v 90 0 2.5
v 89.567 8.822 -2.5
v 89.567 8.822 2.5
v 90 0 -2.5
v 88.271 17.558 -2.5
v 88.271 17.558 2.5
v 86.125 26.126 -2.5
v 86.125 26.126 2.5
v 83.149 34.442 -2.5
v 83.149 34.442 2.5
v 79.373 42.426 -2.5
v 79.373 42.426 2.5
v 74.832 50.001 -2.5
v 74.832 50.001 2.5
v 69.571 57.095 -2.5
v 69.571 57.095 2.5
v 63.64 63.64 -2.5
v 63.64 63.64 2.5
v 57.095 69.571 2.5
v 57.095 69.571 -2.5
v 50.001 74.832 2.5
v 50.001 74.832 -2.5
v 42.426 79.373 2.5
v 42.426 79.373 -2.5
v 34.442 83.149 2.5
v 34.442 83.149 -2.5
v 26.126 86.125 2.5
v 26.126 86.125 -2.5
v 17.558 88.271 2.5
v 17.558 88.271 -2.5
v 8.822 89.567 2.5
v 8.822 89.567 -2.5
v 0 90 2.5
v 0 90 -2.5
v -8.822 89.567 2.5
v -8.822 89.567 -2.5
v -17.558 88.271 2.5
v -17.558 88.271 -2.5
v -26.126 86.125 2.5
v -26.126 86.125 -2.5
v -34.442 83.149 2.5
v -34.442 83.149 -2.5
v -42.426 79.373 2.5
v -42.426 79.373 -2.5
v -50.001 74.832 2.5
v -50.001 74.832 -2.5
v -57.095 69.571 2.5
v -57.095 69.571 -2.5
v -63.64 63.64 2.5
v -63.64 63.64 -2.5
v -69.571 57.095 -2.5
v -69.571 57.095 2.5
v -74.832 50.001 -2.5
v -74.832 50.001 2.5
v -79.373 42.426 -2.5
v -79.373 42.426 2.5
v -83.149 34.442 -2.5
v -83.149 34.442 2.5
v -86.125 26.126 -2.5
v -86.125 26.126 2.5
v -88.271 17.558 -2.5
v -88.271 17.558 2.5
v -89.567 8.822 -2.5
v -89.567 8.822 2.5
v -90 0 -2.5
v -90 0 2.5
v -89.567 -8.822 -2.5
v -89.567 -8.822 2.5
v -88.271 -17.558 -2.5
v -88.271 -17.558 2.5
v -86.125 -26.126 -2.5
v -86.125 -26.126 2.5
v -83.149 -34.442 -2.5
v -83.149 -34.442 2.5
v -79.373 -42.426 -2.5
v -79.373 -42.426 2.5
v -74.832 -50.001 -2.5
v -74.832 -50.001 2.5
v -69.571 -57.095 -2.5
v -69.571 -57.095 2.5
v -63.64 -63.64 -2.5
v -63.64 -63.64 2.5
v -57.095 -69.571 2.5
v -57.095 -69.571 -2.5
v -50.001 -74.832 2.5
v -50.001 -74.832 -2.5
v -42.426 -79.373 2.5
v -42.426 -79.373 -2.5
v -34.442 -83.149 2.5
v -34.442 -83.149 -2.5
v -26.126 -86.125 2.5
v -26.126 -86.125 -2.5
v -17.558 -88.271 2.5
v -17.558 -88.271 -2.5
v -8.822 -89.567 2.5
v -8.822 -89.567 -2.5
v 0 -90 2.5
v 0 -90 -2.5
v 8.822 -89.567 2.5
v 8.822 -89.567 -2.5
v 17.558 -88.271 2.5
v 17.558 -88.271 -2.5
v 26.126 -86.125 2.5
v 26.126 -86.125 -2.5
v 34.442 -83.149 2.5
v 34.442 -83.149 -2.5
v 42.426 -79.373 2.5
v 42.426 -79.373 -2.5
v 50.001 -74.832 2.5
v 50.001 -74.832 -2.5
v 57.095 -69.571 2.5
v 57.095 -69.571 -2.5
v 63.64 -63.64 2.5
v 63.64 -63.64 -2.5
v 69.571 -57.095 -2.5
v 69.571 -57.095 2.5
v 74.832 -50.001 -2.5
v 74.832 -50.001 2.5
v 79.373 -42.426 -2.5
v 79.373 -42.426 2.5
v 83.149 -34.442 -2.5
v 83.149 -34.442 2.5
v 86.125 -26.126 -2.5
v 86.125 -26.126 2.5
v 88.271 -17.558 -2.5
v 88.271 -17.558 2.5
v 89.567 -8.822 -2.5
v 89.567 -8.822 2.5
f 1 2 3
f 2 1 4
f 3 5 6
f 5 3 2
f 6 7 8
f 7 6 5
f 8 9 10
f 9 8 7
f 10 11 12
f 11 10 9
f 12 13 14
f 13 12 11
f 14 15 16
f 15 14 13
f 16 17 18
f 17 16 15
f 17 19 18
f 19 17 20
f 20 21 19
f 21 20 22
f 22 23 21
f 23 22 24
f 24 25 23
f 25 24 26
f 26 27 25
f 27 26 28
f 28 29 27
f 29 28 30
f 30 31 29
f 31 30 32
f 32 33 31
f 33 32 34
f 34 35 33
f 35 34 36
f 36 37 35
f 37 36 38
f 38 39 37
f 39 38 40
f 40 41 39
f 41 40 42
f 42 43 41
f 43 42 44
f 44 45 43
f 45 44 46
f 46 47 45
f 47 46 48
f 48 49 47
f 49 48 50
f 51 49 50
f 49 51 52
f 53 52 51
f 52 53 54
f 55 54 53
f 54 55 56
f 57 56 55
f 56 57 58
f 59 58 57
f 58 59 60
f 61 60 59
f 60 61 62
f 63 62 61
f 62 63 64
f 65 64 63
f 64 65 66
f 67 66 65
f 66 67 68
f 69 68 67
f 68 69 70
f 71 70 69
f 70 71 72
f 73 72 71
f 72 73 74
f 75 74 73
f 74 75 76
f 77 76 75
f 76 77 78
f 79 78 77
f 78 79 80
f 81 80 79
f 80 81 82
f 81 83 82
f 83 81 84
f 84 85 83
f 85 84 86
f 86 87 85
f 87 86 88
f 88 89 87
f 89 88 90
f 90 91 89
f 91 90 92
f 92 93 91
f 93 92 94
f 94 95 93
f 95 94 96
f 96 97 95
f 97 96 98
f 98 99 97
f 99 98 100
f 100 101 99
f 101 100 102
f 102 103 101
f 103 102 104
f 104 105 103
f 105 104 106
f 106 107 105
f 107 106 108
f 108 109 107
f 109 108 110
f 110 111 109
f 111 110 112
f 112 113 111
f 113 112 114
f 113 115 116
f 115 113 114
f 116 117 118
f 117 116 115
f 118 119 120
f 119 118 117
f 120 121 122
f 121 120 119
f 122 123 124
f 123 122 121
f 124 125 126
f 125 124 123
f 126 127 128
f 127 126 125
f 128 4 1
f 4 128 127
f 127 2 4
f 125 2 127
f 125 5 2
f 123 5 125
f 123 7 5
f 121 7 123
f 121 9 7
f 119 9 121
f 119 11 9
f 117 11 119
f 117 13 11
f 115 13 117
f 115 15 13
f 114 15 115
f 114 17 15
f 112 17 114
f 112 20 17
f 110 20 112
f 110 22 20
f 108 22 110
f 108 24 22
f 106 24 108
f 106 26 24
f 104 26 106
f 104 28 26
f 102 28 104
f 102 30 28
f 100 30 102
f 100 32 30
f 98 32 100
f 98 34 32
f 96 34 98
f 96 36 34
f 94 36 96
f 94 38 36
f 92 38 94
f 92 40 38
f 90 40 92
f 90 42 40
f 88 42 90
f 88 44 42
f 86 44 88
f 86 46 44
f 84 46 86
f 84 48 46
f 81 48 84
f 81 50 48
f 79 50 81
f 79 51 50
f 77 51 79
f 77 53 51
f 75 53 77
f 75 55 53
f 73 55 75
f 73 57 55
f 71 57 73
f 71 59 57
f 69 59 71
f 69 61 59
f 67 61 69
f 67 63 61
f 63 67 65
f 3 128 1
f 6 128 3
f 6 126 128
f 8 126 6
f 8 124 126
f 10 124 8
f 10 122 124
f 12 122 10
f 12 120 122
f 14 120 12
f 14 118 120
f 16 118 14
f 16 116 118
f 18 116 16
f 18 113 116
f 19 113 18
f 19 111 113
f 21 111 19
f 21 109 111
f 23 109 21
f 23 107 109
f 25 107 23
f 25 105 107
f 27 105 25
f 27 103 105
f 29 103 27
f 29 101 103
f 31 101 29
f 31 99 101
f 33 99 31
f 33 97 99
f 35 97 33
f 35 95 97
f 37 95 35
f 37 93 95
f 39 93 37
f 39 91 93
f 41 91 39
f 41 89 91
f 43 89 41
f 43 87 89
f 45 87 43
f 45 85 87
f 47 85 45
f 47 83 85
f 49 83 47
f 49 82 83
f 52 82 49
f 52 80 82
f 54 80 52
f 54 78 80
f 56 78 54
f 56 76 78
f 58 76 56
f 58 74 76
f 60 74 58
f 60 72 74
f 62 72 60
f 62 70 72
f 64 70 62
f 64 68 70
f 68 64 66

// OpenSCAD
module DriveSprocket()
{
  /* TODO */
  $fn = 64;
  cylinder(d=180, h=5, center=true);
}

DriveSprocket();
